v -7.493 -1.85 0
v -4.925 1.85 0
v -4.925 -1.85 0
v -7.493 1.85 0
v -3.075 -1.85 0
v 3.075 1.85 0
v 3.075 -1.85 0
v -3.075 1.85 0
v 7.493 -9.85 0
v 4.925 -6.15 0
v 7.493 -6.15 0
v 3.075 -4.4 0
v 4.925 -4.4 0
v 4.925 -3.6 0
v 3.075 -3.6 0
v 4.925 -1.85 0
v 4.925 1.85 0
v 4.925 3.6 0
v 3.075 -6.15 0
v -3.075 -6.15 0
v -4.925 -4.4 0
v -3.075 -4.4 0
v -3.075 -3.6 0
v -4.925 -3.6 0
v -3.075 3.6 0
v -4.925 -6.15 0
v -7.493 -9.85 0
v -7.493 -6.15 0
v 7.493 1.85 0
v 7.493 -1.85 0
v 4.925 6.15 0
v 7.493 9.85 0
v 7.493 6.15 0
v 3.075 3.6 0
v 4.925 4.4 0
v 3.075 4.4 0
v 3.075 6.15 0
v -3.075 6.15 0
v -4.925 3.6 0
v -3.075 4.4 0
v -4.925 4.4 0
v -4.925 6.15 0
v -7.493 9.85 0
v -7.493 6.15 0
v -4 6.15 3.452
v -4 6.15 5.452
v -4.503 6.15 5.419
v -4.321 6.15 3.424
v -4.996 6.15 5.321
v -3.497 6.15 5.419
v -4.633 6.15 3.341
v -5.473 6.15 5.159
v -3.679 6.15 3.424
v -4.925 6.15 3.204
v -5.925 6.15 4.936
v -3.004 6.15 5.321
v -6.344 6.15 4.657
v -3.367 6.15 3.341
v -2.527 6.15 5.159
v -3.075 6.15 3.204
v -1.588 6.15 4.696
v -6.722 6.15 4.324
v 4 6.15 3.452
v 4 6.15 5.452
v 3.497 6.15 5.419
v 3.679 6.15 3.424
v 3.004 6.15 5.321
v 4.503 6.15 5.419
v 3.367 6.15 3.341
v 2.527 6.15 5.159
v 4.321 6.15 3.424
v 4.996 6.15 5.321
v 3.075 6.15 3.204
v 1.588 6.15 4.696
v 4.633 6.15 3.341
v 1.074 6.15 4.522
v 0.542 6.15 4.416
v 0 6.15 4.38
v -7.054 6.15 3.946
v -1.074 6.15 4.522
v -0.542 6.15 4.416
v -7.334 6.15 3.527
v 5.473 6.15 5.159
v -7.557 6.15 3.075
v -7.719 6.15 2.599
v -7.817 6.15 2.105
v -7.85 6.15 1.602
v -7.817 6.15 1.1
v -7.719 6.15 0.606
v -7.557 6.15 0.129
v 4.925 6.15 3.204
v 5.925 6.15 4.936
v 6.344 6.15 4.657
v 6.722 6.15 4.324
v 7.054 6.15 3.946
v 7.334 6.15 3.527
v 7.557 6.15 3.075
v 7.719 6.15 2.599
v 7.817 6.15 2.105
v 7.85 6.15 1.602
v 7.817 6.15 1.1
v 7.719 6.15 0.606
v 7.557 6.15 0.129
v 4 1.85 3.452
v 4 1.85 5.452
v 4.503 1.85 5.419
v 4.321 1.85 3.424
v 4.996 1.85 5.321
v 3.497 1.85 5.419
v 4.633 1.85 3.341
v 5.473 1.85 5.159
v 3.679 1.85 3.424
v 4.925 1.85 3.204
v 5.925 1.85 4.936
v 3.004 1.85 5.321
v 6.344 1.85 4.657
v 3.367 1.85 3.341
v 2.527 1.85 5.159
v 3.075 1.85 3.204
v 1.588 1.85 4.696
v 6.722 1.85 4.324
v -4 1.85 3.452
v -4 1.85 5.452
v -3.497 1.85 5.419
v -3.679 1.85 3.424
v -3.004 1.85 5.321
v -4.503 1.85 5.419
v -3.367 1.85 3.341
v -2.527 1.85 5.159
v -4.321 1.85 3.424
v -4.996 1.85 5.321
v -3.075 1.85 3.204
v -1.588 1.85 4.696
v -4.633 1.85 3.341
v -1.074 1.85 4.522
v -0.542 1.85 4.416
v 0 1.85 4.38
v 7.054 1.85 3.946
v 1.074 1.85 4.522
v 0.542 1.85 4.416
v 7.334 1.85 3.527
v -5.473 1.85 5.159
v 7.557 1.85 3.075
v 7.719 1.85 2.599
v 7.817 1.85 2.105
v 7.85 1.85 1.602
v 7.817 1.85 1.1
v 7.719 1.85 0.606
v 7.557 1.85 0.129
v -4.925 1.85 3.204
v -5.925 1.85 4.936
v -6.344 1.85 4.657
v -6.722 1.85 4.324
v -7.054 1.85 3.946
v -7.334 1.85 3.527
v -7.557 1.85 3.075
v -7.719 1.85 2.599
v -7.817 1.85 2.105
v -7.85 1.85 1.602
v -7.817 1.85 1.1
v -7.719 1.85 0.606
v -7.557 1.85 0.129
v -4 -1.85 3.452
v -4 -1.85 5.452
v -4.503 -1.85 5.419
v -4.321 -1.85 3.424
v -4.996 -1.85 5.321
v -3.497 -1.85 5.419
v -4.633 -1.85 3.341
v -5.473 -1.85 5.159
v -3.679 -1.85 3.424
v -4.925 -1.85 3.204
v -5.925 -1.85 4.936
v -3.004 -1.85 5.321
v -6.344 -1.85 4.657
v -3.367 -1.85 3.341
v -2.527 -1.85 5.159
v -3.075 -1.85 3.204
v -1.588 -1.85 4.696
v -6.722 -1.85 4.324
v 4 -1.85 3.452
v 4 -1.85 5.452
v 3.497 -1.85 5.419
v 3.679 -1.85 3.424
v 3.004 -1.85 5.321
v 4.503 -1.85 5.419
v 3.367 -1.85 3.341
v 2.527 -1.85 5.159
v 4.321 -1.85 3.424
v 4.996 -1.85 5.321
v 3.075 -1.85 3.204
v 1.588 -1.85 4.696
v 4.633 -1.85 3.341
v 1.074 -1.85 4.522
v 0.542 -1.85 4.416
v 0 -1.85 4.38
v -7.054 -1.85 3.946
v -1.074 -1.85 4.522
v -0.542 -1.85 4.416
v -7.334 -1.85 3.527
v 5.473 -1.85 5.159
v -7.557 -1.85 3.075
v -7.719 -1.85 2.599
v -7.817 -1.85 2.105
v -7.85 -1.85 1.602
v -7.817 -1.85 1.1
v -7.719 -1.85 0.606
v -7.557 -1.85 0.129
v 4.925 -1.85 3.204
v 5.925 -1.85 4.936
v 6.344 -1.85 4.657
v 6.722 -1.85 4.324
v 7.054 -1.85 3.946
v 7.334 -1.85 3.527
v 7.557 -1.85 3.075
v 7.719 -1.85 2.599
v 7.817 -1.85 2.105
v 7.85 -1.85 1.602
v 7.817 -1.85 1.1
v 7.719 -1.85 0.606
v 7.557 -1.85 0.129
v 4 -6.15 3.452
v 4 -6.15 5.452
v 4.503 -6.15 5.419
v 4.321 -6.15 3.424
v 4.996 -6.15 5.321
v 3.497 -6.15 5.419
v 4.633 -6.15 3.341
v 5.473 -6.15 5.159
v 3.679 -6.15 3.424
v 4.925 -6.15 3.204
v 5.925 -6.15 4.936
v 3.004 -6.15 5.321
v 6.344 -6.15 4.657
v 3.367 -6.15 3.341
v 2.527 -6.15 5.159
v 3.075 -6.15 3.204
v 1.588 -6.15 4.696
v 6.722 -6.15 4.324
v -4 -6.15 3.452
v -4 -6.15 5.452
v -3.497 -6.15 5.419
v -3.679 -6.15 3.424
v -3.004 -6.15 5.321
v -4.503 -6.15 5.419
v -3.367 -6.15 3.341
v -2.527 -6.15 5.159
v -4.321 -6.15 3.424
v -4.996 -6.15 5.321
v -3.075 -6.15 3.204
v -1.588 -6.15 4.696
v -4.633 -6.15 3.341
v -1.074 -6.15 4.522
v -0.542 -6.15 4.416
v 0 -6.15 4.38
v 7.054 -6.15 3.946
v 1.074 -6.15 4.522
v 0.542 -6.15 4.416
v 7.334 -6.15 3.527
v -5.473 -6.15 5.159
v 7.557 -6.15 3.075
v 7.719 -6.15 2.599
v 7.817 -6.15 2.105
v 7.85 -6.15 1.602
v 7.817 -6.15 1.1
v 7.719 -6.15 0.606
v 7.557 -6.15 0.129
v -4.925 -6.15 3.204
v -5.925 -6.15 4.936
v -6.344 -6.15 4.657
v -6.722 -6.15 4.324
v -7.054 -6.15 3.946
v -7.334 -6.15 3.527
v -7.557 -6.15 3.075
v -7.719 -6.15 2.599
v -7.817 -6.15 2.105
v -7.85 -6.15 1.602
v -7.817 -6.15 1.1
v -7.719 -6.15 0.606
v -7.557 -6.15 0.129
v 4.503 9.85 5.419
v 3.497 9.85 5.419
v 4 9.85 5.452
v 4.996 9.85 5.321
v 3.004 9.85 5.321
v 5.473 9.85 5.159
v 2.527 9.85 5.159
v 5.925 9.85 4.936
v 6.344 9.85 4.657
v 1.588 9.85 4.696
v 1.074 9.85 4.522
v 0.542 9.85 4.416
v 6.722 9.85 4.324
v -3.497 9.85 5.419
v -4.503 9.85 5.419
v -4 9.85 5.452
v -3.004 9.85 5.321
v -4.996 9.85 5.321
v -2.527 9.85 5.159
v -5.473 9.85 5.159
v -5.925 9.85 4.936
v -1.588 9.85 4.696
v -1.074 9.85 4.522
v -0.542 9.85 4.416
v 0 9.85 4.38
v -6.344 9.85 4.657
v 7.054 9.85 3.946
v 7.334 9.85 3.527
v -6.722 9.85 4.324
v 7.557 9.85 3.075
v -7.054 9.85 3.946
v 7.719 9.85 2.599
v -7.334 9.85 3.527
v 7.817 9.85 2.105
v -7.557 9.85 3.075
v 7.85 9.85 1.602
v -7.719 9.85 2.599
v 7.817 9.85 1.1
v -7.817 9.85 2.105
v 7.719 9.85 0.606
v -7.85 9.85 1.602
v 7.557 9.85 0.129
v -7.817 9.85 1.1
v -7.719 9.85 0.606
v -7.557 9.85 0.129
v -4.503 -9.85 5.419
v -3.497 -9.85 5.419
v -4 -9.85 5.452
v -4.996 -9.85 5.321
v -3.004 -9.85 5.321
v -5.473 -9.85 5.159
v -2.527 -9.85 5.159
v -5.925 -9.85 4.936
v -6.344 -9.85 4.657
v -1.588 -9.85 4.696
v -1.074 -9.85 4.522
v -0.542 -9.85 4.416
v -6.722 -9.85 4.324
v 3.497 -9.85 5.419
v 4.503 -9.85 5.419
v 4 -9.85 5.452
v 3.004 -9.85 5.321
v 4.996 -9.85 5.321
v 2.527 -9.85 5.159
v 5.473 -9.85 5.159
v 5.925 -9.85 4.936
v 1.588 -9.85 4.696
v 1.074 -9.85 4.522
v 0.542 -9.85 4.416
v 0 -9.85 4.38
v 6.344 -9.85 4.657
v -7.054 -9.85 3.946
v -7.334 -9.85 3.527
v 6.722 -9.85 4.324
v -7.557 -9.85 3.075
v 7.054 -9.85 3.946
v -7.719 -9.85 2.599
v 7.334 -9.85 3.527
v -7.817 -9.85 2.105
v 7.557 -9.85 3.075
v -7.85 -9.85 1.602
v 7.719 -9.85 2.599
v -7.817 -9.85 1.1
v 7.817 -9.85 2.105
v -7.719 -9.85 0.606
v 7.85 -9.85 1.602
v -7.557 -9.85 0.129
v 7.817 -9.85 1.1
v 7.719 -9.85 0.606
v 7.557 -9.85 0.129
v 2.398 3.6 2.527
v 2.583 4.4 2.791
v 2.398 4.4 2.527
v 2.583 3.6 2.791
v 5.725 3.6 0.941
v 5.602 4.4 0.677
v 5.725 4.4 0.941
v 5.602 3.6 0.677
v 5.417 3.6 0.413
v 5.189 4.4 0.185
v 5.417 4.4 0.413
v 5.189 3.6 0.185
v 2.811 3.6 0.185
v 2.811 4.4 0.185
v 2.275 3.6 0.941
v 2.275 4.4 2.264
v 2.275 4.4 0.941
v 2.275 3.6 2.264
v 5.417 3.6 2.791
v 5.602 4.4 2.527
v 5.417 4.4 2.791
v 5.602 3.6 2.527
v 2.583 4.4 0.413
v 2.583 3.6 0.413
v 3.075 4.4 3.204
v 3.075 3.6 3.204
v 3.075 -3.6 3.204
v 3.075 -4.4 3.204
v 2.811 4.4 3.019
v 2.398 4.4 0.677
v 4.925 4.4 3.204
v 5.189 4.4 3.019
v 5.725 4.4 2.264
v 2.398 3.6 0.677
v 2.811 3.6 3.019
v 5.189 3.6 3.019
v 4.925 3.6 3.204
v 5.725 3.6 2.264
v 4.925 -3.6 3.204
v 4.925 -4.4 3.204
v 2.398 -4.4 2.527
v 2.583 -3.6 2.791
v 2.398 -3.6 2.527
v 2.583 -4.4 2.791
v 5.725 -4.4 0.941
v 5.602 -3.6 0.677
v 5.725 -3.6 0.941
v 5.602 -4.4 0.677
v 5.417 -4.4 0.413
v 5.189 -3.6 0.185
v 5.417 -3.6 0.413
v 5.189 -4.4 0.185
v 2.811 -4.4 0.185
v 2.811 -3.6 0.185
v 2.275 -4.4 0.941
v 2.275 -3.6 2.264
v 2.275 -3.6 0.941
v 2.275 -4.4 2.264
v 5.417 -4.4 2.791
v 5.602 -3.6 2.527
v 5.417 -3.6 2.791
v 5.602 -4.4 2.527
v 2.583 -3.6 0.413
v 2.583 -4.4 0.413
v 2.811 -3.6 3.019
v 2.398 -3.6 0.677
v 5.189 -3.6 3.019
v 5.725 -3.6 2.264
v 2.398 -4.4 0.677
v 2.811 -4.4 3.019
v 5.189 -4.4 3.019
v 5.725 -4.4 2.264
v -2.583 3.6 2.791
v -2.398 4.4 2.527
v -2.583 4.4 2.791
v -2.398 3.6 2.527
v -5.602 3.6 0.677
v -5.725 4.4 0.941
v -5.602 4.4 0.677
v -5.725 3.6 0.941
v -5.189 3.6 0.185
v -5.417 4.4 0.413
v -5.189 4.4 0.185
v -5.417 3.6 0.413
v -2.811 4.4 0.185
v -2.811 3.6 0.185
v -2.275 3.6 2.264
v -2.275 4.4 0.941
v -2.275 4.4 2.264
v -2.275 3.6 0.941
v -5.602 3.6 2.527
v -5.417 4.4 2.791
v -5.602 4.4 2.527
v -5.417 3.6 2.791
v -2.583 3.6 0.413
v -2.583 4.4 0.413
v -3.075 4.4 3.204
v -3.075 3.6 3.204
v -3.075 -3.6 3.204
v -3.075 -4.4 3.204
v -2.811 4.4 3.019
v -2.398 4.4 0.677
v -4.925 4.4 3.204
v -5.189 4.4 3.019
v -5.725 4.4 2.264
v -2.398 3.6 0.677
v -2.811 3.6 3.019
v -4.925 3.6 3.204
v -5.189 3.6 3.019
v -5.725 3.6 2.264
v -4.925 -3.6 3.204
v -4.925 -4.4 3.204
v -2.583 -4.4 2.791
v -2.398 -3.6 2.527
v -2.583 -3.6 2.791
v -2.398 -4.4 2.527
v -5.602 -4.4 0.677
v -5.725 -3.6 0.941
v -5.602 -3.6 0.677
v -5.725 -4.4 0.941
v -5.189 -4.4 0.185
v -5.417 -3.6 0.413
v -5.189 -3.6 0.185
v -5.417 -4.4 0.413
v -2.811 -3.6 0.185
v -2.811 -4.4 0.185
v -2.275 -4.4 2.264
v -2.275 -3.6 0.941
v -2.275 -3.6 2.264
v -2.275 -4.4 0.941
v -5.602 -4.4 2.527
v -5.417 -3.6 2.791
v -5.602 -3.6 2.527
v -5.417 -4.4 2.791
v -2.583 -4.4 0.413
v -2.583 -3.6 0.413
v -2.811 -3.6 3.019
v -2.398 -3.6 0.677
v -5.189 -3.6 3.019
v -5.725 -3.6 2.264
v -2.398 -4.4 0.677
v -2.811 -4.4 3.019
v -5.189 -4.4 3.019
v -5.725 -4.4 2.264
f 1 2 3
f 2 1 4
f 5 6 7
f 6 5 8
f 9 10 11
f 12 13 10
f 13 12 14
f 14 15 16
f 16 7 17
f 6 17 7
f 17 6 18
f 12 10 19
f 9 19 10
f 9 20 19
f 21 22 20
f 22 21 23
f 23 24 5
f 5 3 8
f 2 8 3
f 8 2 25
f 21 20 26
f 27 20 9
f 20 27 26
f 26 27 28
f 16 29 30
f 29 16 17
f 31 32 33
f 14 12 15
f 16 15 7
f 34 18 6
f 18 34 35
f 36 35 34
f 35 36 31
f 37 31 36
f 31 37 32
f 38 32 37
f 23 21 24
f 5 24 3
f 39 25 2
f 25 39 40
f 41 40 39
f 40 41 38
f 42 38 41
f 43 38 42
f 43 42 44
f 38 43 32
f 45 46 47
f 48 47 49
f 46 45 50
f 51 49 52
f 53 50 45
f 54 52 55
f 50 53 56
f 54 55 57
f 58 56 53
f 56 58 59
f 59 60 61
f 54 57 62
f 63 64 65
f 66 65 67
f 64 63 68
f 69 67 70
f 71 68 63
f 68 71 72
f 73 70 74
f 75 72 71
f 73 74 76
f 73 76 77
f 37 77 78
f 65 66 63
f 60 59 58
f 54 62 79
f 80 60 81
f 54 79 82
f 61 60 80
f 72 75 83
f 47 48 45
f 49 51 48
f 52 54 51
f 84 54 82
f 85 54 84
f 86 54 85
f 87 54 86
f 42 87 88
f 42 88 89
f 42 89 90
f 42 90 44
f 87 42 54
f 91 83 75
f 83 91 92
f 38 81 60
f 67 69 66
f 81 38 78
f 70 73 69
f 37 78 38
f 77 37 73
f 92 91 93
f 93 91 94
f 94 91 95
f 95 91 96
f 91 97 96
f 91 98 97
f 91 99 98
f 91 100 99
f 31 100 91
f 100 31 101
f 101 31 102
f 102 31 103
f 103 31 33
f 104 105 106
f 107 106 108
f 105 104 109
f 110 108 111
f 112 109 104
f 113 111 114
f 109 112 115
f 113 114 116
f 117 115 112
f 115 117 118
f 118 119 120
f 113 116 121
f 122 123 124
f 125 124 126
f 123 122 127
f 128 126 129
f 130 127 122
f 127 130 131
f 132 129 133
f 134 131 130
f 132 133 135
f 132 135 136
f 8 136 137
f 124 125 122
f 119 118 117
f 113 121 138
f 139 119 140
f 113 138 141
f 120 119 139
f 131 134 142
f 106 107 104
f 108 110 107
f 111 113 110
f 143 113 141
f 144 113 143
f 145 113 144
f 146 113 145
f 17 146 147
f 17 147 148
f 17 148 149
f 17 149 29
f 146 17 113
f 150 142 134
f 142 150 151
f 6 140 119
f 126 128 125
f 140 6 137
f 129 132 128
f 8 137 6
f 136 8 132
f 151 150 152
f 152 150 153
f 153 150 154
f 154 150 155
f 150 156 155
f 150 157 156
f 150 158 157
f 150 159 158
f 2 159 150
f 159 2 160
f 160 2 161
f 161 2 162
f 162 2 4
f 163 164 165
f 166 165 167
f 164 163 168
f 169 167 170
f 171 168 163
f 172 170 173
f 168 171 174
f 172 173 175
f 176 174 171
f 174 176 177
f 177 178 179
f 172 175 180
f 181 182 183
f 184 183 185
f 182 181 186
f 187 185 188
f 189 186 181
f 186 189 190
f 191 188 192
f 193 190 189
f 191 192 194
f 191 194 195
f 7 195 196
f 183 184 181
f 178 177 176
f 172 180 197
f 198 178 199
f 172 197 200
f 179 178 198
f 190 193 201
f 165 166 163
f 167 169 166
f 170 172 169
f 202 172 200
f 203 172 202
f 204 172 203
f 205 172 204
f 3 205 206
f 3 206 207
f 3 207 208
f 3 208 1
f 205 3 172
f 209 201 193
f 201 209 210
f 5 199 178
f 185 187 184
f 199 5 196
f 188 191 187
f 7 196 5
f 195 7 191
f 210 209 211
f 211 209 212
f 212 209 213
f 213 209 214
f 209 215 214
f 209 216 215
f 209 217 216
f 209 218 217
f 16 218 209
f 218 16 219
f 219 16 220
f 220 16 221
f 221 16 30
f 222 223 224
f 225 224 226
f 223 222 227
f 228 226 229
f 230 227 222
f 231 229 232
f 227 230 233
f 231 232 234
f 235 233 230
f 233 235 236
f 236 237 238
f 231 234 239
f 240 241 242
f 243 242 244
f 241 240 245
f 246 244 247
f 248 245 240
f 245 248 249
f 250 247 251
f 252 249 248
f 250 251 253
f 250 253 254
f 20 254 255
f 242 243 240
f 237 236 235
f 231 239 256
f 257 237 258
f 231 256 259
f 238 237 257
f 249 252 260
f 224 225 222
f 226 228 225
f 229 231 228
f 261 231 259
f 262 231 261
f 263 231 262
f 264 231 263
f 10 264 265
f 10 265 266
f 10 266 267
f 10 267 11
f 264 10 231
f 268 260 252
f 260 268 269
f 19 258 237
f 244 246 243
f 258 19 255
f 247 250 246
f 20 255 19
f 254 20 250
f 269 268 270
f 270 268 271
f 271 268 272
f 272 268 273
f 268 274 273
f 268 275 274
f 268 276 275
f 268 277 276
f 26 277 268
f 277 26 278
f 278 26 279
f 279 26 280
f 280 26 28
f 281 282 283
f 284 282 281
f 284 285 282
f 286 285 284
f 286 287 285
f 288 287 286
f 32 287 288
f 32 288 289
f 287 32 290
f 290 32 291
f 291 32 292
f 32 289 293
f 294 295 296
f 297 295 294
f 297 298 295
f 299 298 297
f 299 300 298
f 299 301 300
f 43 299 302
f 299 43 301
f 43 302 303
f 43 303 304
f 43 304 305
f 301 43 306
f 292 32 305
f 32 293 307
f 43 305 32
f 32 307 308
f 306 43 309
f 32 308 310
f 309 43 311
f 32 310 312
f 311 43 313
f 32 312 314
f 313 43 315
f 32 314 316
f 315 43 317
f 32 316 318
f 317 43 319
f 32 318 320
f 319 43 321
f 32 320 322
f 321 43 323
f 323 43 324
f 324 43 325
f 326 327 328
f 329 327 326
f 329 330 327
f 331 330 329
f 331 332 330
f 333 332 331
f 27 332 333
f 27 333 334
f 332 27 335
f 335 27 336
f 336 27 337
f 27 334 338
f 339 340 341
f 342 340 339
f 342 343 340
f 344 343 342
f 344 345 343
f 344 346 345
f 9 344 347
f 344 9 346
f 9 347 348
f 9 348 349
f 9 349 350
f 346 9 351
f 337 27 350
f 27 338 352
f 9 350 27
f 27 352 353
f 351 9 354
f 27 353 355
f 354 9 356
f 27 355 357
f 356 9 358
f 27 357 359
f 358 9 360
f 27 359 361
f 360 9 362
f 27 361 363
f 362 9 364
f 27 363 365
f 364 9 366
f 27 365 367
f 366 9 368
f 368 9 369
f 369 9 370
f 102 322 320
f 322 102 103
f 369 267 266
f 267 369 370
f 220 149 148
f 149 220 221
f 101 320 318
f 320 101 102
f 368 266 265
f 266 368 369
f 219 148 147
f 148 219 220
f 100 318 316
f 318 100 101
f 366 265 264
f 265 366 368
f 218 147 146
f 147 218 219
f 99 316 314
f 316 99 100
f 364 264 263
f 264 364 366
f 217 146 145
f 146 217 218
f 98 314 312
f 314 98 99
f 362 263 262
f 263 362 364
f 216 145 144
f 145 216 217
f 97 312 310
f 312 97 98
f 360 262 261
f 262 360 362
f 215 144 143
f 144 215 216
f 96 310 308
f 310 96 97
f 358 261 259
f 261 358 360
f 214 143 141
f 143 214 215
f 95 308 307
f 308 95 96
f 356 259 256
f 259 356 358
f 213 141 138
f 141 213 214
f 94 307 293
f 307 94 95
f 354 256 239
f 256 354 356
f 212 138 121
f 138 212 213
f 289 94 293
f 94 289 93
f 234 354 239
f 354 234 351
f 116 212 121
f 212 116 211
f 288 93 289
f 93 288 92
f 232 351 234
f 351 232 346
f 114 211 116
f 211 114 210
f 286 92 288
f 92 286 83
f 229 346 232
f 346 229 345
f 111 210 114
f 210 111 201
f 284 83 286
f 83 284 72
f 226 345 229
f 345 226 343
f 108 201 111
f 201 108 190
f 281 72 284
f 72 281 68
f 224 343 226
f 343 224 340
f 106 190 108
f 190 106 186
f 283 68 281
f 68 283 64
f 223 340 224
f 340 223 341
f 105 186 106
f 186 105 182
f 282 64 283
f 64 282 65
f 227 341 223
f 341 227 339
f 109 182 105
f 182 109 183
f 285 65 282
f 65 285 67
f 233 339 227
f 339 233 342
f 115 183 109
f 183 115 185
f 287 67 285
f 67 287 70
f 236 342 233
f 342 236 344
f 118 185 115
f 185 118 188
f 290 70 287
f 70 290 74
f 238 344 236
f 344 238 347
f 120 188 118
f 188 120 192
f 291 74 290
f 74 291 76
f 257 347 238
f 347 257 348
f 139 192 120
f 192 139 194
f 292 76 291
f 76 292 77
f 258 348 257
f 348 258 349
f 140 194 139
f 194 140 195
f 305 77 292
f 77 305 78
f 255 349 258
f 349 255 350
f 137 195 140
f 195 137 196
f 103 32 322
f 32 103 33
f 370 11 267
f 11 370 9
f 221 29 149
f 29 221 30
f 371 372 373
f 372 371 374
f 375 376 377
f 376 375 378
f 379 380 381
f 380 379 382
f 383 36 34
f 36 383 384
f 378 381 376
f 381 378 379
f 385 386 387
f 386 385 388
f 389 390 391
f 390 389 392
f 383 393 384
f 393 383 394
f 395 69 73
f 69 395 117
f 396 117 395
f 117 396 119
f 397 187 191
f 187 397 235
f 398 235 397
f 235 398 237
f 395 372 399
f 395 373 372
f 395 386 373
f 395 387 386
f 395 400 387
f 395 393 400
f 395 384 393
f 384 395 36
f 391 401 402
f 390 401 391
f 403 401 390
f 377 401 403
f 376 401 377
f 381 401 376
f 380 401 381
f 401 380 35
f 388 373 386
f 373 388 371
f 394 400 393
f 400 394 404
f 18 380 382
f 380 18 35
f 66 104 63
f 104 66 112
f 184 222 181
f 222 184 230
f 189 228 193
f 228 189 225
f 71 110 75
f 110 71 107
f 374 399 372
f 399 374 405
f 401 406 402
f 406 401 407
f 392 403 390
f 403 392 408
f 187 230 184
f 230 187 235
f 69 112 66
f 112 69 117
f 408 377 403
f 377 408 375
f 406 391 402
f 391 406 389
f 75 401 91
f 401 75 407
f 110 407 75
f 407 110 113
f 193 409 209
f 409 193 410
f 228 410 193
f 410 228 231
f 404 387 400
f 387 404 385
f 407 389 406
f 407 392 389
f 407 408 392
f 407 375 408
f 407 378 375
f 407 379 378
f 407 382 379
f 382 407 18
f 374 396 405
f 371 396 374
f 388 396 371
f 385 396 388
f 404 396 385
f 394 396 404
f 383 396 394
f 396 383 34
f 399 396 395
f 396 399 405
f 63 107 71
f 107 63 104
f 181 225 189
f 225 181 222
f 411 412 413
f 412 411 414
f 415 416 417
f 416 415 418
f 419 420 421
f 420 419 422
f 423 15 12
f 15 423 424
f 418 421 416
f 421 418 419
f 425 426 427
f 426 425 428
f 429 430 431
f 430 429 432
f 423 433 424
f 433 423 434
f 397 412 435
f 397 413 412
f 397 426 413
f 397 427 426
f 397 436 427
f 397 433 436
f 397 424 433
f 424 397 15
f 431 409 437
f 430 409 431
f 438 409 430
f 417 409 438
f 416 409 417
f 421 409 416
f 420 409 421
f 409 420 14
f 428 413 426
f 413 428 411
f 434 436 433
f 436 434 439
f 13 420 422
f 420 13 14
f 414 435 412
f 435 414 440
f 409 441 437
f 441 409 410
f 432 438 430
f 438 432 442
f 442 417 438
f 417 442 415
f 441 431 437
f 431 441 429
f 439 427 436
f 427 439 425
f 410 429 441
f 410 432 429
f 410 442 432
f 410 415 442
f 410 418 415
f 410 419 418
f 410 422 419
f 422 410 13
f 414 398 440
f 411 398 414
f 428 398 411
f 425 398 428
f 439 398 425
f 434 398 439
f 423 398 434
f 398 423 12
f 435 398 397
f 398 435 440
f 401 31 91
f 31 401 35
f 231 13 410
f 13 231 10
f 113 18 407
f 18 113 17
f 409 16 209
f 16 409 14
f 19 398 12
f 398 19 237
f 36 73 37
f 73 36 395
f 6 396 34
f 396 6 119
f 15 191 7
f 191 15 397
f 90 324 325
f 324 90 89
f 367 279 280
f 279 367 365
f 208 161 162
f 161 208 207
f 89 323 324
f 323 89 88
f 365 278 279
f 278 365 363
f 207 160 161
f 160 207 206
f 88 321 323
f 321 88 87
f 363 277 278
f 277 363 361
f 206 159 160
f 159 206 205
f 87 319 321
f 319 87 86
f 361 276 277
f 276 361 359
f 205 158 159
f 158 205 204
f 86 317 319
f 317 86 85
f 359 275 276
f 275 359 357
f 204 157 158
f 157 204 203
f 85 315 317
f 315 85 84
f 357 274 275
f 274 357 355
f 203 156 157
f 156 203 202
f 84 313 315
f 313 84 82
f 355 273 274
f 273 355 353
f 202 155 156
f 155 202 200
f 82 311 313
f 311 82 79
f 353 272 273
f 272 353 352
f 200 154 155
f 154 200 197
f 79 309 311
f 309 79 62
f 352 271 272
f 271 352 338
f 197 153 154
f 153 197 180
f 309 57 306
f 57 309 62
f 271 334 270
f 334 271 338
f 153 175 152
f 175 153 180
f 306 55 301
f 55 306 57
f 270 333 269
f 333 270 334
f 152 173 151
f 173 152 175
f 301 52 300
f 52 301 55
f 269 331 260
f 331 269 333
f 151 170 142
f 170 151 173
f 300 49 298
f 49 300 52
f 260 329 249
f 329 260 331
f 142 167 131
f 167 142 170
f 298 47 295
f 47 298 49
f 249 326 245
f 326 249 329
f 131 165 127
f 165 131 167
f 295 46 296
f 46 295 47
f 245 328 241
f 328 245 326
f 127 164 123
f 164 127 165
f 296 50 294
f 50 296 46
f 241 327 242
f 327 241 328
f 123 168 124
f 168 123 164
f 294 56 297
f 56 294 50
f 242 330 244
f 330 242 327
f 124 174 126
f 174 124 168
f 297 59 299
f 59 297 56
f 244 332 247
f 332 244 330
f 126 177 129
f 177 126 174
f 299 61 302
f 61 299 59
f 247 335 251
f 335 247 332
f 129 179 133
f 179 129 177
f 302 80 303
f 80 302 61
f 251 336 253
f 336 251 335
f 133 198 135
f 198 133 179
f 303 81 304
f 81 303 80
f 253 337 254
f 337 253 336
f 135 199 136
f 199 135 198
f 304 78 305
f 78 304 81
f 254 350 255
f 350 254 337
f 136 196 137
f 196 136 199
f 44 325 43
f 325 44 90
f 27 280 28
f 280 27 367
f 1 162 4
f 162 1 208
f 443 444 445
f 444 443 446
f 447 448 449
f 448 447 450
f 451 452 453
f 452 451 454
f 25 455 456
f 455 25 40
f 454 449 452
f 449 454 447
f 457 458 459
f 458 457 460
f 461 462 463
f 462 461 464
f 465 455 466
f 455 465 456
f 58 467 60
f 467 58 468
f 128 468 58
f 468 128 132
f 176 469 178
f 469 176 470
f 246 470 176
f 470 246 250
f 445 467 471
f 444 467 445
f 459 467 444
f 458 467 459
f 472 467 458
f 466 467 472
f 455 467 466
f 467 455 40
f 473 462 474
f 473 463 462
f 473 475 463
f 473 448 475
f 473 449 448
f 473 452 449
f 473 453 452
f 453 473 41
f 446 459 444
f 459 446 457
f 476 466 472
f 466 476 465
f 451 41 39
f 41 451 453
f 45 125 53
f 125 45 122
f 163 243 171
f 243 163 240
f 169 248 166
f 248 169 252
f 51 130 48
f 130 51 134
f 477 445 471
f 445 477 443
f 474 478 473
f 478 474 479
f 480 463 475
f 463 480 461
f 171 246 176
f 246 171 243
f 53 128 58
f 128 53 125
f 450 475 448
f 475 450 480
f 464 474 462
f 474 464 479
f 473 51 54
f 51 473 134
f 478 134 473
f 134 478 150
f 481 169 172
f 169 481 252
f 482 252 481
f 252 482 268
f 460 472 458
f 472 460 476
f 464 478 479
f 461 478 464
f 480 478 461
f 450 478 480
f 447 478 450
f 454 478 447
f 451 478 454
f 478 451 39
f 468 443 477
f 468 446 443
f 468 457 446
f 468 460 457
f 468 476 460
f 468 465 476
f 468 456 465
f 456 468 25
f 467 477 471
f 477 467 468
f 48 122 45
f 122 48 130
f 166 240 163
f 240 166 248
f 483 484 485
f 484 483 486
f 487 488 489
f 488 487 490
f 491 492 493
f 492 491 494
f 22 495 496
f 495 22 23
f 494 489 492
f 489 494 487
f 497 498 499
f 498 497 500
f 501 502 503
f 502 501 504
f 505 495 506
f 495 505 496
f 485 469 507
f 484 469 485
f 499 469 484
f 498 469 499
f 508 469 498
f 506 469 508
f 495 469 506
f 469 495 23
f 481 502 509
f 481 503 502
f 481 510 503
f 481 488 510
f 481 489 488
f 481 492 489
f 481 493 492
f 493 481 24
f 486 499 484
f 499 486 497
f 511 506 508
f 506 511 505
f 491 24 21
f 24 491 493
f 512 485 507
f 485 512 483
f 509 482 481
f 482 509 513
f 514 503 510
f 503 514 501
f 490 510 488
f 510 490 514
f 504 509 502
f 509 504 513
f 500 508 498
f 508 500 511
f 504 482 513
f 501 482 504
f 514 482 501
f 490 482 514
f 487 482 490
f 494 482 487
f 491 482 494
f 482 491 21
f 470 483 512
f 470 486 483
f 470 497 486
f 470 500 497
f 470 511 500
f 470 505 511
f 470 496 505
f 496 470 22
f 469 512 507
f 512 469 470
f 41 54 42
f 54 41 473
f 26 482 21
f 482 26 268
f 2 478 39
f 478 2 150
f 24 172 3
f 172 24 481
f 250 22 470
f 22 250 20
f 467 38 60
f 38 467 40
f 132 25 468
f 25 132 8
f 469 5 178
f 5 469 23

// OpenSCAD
// Missling Link provided by Stellar Innovation
// http://www.thingiverse.com/stellarinnovation/about
// under Creative Commons License, Attribution (BY)

// Diameter of the axle
axleDiameter = 4; // [1:0.5:10]

// Thickness of various walls
wallThickness = 2; // [1:0.5:5]

// Clearance between moving parts
clearance = 0.3; // [0.1:0.05:0.5]

// part to print
partToPrint = 1; // [1:type-A (link with axle), 2: type-B (link with bushing), 3: type-C (center link), 4: type-M (magnet lock), 5: type-P (pocket), 6: type-T (transformation link)]

// Width of link at the center
centerLinkWidth = 4; // [1:0.5:10]

// Width of all other links
otherLinkWidth = 4; // [1:0.5:10]

// Number of links on each side of the center
numLinksOnEachSide = 2; // [1:4];

// Longer links
extraLength = 0; // [0:25]

// Depth of pocket (type-P links)
pocketDepth = 2.5; // [0:0.5:20]

// Magnet diameter (type-M links)
magnetDiameter = 4; // [1:0.1:25]

// Magnet length
magnetLength = 6; // [1:0.1:25]

// Top stop angle (90 = no stop block)
topStopAngle = 90; // [0:90]

// Bottom stop angle (90 = no stop block)
bottomStopAngle = 90; // [0:90]

outerDiameter = axleDiameter + 2*wallThickness;

if (partToPrint==1)
  TypeALink(centerLinkWidth, otherLinkWidth, numLinksOnEachSide, outerDiameter, axleDiameter, extraLength, clearance, topStopAngle);
else if (partToPrint==2)
  TypeBLink(otherLinkWidth, outerDiameter, axleDiameter, extraLength, clearance, topStopAngle, bottomStopAngle);
else if (partToPrint==3)
  TypeBLink(centerLinkWidth, outerDiameter, axleDiameter, extraLength, clearance, topStopAngle, bottomStopAngle);
else if (partToPrint==4)
  TypeMLink(centerLinkWidth, otherLinkWidth, numLinksOnEachSide, outerDiameter, axleDiameter, magnetDiameter, magnetLength, extraLength, wallThickness, clearance, topStopAngle);
else if (partToPrint==5)
  TypePLink(centerLinkWidth, otherLinkWidth, numLinksOnEachSide, outerDiameter, axleDiameter, extraLength, pocketDepth, wallThickness, clearance, topStopAngle);
else if (partToPrint==6)
  TypeTLink(centerLinkWidth, otherLinkWidth, numLinksOnEachSide, outerDiameter, axleDiameter, extraLength, clearance, topStopAngle);

// Link with axle (type-A)

module TypeALink(centerLinkWidth,
                    otherLinkWidth,
                    numLinksOnEachSide,
                    outerDiameter,
                    axleDiameter,
                    extraLength = 0,
                    clearance = 0,
                    topStopAngle = 90) {
  
  HalfALinkWithAxle(centerLinkWidth, otherLinkWidth, numLinksOnEachSide, outerDiameter, axleDiameter, 0.5*extraLength, clearance, topStopAngle);
  mirror([1, 0, 0])
    HalfALinkWithAxle(centerLinkWidth, otherLinkWidth, numLinksOnEachSide, outerDiameter, axleDiameter, 0.5*extraLength, clearance, topStopAngle);
}

// Link with bushing (type-B)

module TypeBLink(linkWidth,
                 outerDiameter, 
                 axleDiameter,
                 extraLength = 0,
                 clearance = 0,
                 topStopAngle = 90,
                 bottomStopAngle = 90) {
  linear_extrude(height=linkWidth-clearance) {
    HalfALink(outerDiameter = outerDiameter, 
               axleDiameter = axleDiameter, 
               openingGap = 0.5*axleDiameter,
               extraLength = 0.5*extraLength, 
               clearance = clearance,
               topStopAngle = topStopAngle,
               bottomStopAngle = bottomStopAngle);
    mirror([1, 0, 0])
      HalfALink(outerDiameter = outerDiameter, 
                 axleDiameter = axleDiameter, 
                 openingGap = 0.5*axleDiameter,
                 extraLength = 0.5*extraLength,
                 clearance = clearance,
                 topStopAngle = topStopAngle,
                 bottomStopAngle = bottomStopAngle);
  }
}

// Link with magnet lock (type-M)

module TypeMLink(centerLinkWidth,
                    otherLinkWidth,
                    numLinksOnEachSide,
                    outerDiameter,
                    axleDiameter,
                    magnetDiameter,
                    magnetLength,
                    extraLength,
                    wall,
                    clearance = 0,
                    topStopAngle = 90) {
  totalWidth = centerLinkWidth + 2*numLinksOnEachSide*otherLinkWidth - clearance;
  r1 = 0.5*(axleDiameter - clearance);
  z1 = sqrt(0.75)*r1; 
  r2 = 0.5*outerDiameter;
  z2 = sqrt(3)*r2;
  height = z1+z2-r2-0.5*clearance;
  length = wall + magnetLength + extraLength;
                        
  mirror([1, 0, 0])
    HalfALinkWithAxle(centerLinkWidth, otherLinkWidth, numLinksOnEachSide, outerDiameter, axleDiameter, 0, clearance, topStopAngle);
                        
  difference() {
    union() {
      translate([0, -0.5*totalWidth])
        cube([length, totalWidth, height]);
      translate([wall+extraLength, 0, 0.5*magnetDiameter+wall])
        rotate([0, 90])
          cylinder(d=magnetDiameter+2*wall, h=magnetLength, $fn=60);
    }
    
    // hole for magnet
    translate([wall+extraLength, 0, 0.5*magnetDiameter+wall])
        rotate([0, 90])
          cylinder(d=magnetDiameter, h=magnetLength, $fn=60);
    
    // clearance for type-B links
    intersection() {
      translate([-0.5*outerDiameter, 0, z1])
        rotate([90, 0])
          cylinder(d=outerDiameter+clearance, h=totalWidth, center=true, $fn=48);
      SlotsForTypeBLinks(centerLinkWidth, otherLinkWidth, numLinksOnEachSide, outerDiameter, 0, clearance);
    }
  }
}
// Link with pocket (type-P)

module TypePLink(centerLinkWidth,
                 otherLinkWidth,
                 numLinksOnEachSide,
                 outerDiameter,
                 axleDiameter,
                 extraLength,
                 pocketDepth,
                 wall,
                 clearance = 0,
                 topStopAngle = 90) {                      
  totalWidth = centerLinkWidth + 2*numLinksOnEachSide*otherLinkWidth - clearance;
  r1 = 0.5*(axleDiameter - clearance);
  z1 = sqrt(0.75)*r1; 
  r2 = 0.5*outerDiameter;
  z2 = sqrt(3)*r2;
  height = z1+z2-r2-0.5*clearance;
  pocketWidth = totalWidth - 2*wall;
  pocketLength = extraLength - 2*wall;
                        
  // Pocket               
  difference() {
    union() {
      TypeALink(centerLinkWidth, otherLinkWidth, numLinksOnEachSide, outerDiameter, axleDiameter, extraLength, clearance, topStopAngle);
  
      if (extraLength>2*clearance)
          rotate([90, 0])
            linear_extrude(height=totalWidth, center=true) {
                TypePSideView(outerDiameter, axleDiameter, 0.5*extraLength, wall, clearance);
                mirror([1, 0])
                  TypePSideView(outerDiameter, axleDiameter, 0.5*extraLength, wall, clearance);
            }
    }
    
    if (pocketDepth>0 && pocketWidth>0 && pocketLength>0)
      translate([0, 0, height-pocketDepth])
        Pocket(pocketLength, pocketWidth, pocketDepth, 1);
  }
}

// Transformation link (type-T) has space for a single, wide, link on one of the axles 
// and any given number of links on the other axle.

module TypeTLink(centerLinkWidth,
                 otherLinkWidth,
                 numLinksOnEachSide,
                 outerDiameter,
                 axleDiameter,
                 extraLength=0,
                 clearance = 0,
                 topStopAngle = 90) {
  transformedLinkWidth = 2*(numLinksOnEachSide-1)*otherLinkWidth + centerLinkWidth;
  TypeALink(transformedLinkWidth, otherLinkWidth, 1, outerDiameter, axleDiameter, extraLength, clearance, topStopAngle);
           
  // Use entirely round parts on the left axis             
  totalWidth = centerLinkWidth + 2*numLinksOnEachSide*otherLinkWidth - clearance;
  r = 0.5*(axleDiameter - clearance);
  z1 = sqrt(0.75)*r;  
  translate([-0.5*(outerDiameter + extraLength), 0]) {
    difference() {
      // the "round part"
      translate([0, 0, z1])
        rotate([90, 0])
          cylinder(d=outerDiameter-clearance, h=totalWidth, center=true, $fn=48); 
      
      // remove slots for the type-B links
      translate([-0.5*outerDiameter, 0])
        SlotsForTypeBLinks(centerLinkWidth, otherLinkWidth, numLinksOnEachSide, outerDiameter, extraLength, clearance);
        
      // remove sub-zero part
      translate([-0.5*outerDiameter, -0.5*totalWidth, -outerDiameter])
        cube([outerDiameter, totalWidth, outerDiameter]);
    }
    
    axleWidth = 0.5*(axleDiameter-clearance);  
    AxleWithBumps(centerLinkWidth, otherLinkWidth, numLinksOnEachSide,
                     axleDiameter, axleWidth, totalWidth, clearance);
  }
}

// (Right) half a type-A link. Left side is the mirror image.

module HalfALinkWithAxle(centerLinkWidth,
                         otherLinkWidth,
                         numLinksOnEachSide,
                         outerDiameter,
                         axleDiameter,
                         extraLength=0,
                         clearance = 0,
                         topStopAngle = 90) {
  totalWidth = centerLinkWidth + 2*numLinksOnEachSide*otherLinkWidth - clearance;
                                
  difference() {
    // extruded type-A link
    rotate([90, 0])
      linear_extrude(height=totalWidth, center=true)
        TypeASideView(outerDiameter=outerDiameter,
                        axleDiameter=axleDiameter,
                        extraLength=extraLength,
                        clearance=clearance,
                        topStopAngle=topStopAngle);

    // Remove slots for the type-B links
    SlotsForTypeBLinks(centerLinkWidth, otherLinkWidth, numLinksOnEachSide, outerDiameter, extraLength, clearance);      
  }
  
  // Axle
  axleWidth = 0.5*(axleDiameter-clearance);
  translate([0.5*outerDiameter + extraLength, 0])
    AxleWithBumps(centerLinkWidth, otherLinkWidth, numLinksOnEachSide,
                     axleDiameter, axleWidth, totalWidth, clearance);
}

// Cuts out slots for the type-B links in one half of a type-A link.

module SlotsForTypeBLinks(centerLinkWidth, otherLinkWidth, numLinksOnEachSide, outerDiameter, extraLength=0, clearance=0) {
    totalWidth = centerLinkWidth + 2*numLinksOnEachSide*otherLinkWidth - clearance;
    // Possible cut-out for center link
    if (numLinksOnEachSide % 2 == 1)
      translate([0, -0.5*(centerLinkWidth+clearance)])
        cube([outerDiameter+extraLength, centerLinkWidth+clearance, outerDiameter]);
      
    // Cut-out for "other links"
    for (n=[1:2:numLinksOnEachSide-1], s=[+1,-1]) {
      y = 0.5*(totalWidth + clearance) - (n+0.5)*otherLinkWidth;
      translate([0, s*y - 0.5*(otherLinkWidth + clearance)]) 
        cube([outerDiameter+extraLength, otherLinkWidth+clearance, outerDiameter]);
    } 
}

// The axles has "bumps" that prevents type-B links to fall off

module AxleWithBumps(centerLinkWidth,
                     otherLinkWidth,
                     numLinksOnEachSide, 
                     diameter, 
                     width, 
                     length, 
                     clearance=0) {
  length = centerLinkWidth + 2*numLinksOnEachSide*otherLinkWidth - clearance;
                             
  Axle(diameter, width, length, clearance);
      
  // "bumps"
  bump = 0.8;  
  for (n=[1:2:numLinksOnEachSide-1], s=[+1,-1]) {
    y = 0.5*(length + clearance) - (n+0.5)*otherLinkWidth;
    translate([0, s*y])
      Axle(diameter, width+2*bump, bump, clearance);
  }
    
  // if center link is cut out, then place a "bump" there too
  if (numLinksOnEachSide % 2 == 1) {
    Axle(diameter, width+2*bump, bump, clearance);
  }
}

// The axle is extruded from the Axle cross-view
//
// diameter    axle diameter (plus clearance)
// width       width of axle at bottom (<diameter)
// length      length of extruded axle
// clerance    distance between moving parts

module Axle(diameter, width, length, clearance=0) {
  rotate([90, 0])
   linear_extrude(height=length, center=true)
     AxleCrossView(diameter, width, clearance); 
}

// The axle lies flat when printed, but it is rounded at the top
//
// diameter    axle diameter (plus clearance)
// width       width of axle at bottom (<diameter)
// clerance    distance between moving parts

module AxleCrossView(diameter, width, clearance=0) {
  r = 0.5*(diameter - clearance);
  x1 = 0.5*width;
  y1 = sqrt(0.75)*r;

  intersection() {
    translate([0, y1])
      circle(r=r, $fn=36);
    translate([-x1, 0])
      square([width, y1+r]);
  }  
}

// The pocket has round corners
//
// length  length of pocket (x-coordinate)
// width   width of pocket (y-coordinate)
// depth   depth of pocket (z-coordinate)
// radius  corner radius

module Pocket(length, width, depth, radius) {
  r = (radius>0 && width>=2*radius && length>=2*radius)? radius : 0;
    
  if (r>0)
     for (j=[-0.5, +0.5], k=[-0.5,+0.5])
       translate([j*(length-2*r), k*(width-2*r)])
         cylinder(r=r, h=depth, $fn=16);
  translate([-0.5*length, -0.5*width+r])
    cube([length, width-2*r, depth]);     
  translate([-0.5*length+r, -0.5*width])
    cube([length-2*r, width, depth]);
}

// Type-P links are constructed from type-A parts with extra length in the middle of the link,
// where a pocket is cut out. This is the part from which the pocket is cut out (side view).
//
// outerDiameter       Diameter of the link (plus clearance)
// axleDiameter        Diameter of the axle (plus clearance)
// extraLength         Length of this part
// wall                Thickness of walls around the pocket
// clearance           Distance between moving parts

module TypePSideView(outerDiameter,
                         axleDiameter,
                         extraLength,
                         wall,
                         clearance = 0) {
  r0 = 0.5*(outerDiameter - clearance);
  r1 = 0.5*(axleDiameter - clearance);
  z1 = sqrt(0.75)*r1; 
  r2 = 0.5*outerDiameter;
  z2 = sqrt(3)*r2;
  height = z1+z2-r2-0.5*clearance;
                        
                 
  difference() {
    union() {
      square([extraLength+wall, height]);
      translate([extraLength, 0])
        square([wall, z2]);
    }  
    
    translate([extraLength, z1+z2])
      circle(d=outerDiameter+clearance, $fn=48);
    translate([0.5*outerDiameter+extraLength, z1])
      circle(d=outerDiameter+clearance, $fn=48);
  }
}

// Half a type-A link viewed from the side
//
// outerDiameter       Diameter of the link (plus clearance)
// axleDiameter        Diameter of the axle (plus clearance)
// openingGap          Specifies the width of a possible opening gap (less clearance)
// extraLength         Makes the links longer
// clearance           Distance between moving parts
// topStopAngle        Angle of top stop block

module TypeASideView(outerDiameter,
                         axleDiameter,
                         extraLength = 0,
                         clearance = 0,
                         topStopAngle = 90) {
  r = 0.5*(axleDiameter - clearance);
  y1 = sqrt(0.75)*r;

  difference() {
    translate([0, y1])
      HalfALink(outerDiameter=outerDiameter,
                 extraLength=extraLength,
                 clearance=clearance,
                 flatBottom=true,
                 topStopAngle=topStopAngle);
    translate([0, -outerDiameter])
      square([outerDiameter+extraLength, outerDiameter]);
  }
}

// Half a Link is the right half of a (Type-A or B) link. It can also be combined with other parts.
//
// outerDiameter       Diameter of the link (plus clearance)
// axleDiameter        A positive value for a bushing with a hole for the axle (i.e type-B link)
// openingGap          Specifies the width of a possible opening gap (less clearance)
// extraLength         Makes the links longer
// clearance           Distance between moving parts
// flatBottom
// topStopAngle        Angle of top stop block
// bottomStopAngle     Angle of bottom stop block  

module HalfALink(outerDiameter,
                 axleDiameter=0,
                 openingGap=0,
                 extraLength = 0,
                 clearance = 0,
                 flatBottom = false,
                 topStopAngle = 90,
                 bottomStopAngle = 90) {
  x0 = 0.5*outerDiameter + extraLength;
  D1 = outerDiameter - clearance;
                       
  difference() {
    union() {
      translate([x0, 0]) {
        circle(d=D1, $fn=48);
        // stop angles (90 degrees=no stop)
        StopBlock(D1, topStopAngle);
        mirror([0,1])
          StopBlock(D1, bottomStopAngle);
      }
      
      // connection between link halves
      y_t = 0.25*sqrt(3)*D1;     
      y0 = flatBottom? -0.5*D1 : -y_t;
      translate([0, y0])
        square([x0, y_t-y0]);
    }
    
    // axle and opening
    translate([x0, 0]) {
      if (axleDiameter > 0)
        circle(d=axleDiameter+clearance, $fn=36);
      if (openingGap > 0) {
        HalfAnOpening(openingGap, outerDiameter, axleDiameter, topStopAngle, clearance);
        mirror([0, 1])
          HalfAnOpening(openingGap, outerDiameter, axleDiameter, bottomStopAngle, clearance);
      }
    }
    
    // Narrow mid part
    D2 = outerDiameter + clearance;
    y2 = 0.5*sqrt(3)*outerDiameter;
    translate([extraLength, y2])
      circle(d=D2, $fn=48);
    translate([0, y2-0.5*D2])
      square([extraLength, D2]);
    
    if (!flatBottom) {
      translate([extraLength, -y2])
        circle(d=D2, $fn=48);
      translate([0, -y2])
      square([extraLength, 0.5*D2]);
    }
  }
}

// The stop block limits the rotation of the links
//
// diameter        diameter of link
// stopAngle       angle (CCW rotation) of stop block 

module StopBlock(diameter, stopAngle) {
  r = 0.5*diameter;
    
  intersection() {
    square([r, r]);
    rotate(stopAngle)
      square([r,r]);
  }
}

// Half an opening is the upper half of the opening of a type-B (bushing) link
//
// opening gap     width of opening (less clearance), half of which is in the upper half (this part)
// axleDiameter    (less clearance)
// stopAngle       angle of stop block (90 degrees=no stop block)
// clearance       distance between moving parts (e.g. axle and bushing)

module HalfAnOpening(openingGap,
                        outerDiameter,
                        axleDiameter,
                        stopAngle = 90,
                        clearance = 0) {
    // bushing for axle
  R = 0.5*(outerDiameter - clearance);
  w = 0.5*(outerDiameter - axleDiameter) - clearance;

  // opening
  y0 = 0.5*openingGap + 0.5*clearance;
  // fancy fillet/radius
  r = 0.5*w;
  Rmid = R - r;
  y1 = y0+r;
  y_t = R*sin(stopAngle);
  // touches outer perimeter or stop block?
  x1 = (y_t < y1)? (Rmid-y1*sin(stopAngle))/cos(stopAngle) : sqrt(Rmid*Rmid-y1*y1);
  x2 = 1.5*R;
  y2 = (y_t < y1)? y1 + (x2-x1)*tan(stopAngle) : y1*x2/x1;
  difference() {
    polygon([[0, 0], [0, y0], [x1, y0], [x1,y1], [x2,y2], [x2, 0]]);
    translate([x1, y1])
      circle(r=r, $fn=24);
  }
}
